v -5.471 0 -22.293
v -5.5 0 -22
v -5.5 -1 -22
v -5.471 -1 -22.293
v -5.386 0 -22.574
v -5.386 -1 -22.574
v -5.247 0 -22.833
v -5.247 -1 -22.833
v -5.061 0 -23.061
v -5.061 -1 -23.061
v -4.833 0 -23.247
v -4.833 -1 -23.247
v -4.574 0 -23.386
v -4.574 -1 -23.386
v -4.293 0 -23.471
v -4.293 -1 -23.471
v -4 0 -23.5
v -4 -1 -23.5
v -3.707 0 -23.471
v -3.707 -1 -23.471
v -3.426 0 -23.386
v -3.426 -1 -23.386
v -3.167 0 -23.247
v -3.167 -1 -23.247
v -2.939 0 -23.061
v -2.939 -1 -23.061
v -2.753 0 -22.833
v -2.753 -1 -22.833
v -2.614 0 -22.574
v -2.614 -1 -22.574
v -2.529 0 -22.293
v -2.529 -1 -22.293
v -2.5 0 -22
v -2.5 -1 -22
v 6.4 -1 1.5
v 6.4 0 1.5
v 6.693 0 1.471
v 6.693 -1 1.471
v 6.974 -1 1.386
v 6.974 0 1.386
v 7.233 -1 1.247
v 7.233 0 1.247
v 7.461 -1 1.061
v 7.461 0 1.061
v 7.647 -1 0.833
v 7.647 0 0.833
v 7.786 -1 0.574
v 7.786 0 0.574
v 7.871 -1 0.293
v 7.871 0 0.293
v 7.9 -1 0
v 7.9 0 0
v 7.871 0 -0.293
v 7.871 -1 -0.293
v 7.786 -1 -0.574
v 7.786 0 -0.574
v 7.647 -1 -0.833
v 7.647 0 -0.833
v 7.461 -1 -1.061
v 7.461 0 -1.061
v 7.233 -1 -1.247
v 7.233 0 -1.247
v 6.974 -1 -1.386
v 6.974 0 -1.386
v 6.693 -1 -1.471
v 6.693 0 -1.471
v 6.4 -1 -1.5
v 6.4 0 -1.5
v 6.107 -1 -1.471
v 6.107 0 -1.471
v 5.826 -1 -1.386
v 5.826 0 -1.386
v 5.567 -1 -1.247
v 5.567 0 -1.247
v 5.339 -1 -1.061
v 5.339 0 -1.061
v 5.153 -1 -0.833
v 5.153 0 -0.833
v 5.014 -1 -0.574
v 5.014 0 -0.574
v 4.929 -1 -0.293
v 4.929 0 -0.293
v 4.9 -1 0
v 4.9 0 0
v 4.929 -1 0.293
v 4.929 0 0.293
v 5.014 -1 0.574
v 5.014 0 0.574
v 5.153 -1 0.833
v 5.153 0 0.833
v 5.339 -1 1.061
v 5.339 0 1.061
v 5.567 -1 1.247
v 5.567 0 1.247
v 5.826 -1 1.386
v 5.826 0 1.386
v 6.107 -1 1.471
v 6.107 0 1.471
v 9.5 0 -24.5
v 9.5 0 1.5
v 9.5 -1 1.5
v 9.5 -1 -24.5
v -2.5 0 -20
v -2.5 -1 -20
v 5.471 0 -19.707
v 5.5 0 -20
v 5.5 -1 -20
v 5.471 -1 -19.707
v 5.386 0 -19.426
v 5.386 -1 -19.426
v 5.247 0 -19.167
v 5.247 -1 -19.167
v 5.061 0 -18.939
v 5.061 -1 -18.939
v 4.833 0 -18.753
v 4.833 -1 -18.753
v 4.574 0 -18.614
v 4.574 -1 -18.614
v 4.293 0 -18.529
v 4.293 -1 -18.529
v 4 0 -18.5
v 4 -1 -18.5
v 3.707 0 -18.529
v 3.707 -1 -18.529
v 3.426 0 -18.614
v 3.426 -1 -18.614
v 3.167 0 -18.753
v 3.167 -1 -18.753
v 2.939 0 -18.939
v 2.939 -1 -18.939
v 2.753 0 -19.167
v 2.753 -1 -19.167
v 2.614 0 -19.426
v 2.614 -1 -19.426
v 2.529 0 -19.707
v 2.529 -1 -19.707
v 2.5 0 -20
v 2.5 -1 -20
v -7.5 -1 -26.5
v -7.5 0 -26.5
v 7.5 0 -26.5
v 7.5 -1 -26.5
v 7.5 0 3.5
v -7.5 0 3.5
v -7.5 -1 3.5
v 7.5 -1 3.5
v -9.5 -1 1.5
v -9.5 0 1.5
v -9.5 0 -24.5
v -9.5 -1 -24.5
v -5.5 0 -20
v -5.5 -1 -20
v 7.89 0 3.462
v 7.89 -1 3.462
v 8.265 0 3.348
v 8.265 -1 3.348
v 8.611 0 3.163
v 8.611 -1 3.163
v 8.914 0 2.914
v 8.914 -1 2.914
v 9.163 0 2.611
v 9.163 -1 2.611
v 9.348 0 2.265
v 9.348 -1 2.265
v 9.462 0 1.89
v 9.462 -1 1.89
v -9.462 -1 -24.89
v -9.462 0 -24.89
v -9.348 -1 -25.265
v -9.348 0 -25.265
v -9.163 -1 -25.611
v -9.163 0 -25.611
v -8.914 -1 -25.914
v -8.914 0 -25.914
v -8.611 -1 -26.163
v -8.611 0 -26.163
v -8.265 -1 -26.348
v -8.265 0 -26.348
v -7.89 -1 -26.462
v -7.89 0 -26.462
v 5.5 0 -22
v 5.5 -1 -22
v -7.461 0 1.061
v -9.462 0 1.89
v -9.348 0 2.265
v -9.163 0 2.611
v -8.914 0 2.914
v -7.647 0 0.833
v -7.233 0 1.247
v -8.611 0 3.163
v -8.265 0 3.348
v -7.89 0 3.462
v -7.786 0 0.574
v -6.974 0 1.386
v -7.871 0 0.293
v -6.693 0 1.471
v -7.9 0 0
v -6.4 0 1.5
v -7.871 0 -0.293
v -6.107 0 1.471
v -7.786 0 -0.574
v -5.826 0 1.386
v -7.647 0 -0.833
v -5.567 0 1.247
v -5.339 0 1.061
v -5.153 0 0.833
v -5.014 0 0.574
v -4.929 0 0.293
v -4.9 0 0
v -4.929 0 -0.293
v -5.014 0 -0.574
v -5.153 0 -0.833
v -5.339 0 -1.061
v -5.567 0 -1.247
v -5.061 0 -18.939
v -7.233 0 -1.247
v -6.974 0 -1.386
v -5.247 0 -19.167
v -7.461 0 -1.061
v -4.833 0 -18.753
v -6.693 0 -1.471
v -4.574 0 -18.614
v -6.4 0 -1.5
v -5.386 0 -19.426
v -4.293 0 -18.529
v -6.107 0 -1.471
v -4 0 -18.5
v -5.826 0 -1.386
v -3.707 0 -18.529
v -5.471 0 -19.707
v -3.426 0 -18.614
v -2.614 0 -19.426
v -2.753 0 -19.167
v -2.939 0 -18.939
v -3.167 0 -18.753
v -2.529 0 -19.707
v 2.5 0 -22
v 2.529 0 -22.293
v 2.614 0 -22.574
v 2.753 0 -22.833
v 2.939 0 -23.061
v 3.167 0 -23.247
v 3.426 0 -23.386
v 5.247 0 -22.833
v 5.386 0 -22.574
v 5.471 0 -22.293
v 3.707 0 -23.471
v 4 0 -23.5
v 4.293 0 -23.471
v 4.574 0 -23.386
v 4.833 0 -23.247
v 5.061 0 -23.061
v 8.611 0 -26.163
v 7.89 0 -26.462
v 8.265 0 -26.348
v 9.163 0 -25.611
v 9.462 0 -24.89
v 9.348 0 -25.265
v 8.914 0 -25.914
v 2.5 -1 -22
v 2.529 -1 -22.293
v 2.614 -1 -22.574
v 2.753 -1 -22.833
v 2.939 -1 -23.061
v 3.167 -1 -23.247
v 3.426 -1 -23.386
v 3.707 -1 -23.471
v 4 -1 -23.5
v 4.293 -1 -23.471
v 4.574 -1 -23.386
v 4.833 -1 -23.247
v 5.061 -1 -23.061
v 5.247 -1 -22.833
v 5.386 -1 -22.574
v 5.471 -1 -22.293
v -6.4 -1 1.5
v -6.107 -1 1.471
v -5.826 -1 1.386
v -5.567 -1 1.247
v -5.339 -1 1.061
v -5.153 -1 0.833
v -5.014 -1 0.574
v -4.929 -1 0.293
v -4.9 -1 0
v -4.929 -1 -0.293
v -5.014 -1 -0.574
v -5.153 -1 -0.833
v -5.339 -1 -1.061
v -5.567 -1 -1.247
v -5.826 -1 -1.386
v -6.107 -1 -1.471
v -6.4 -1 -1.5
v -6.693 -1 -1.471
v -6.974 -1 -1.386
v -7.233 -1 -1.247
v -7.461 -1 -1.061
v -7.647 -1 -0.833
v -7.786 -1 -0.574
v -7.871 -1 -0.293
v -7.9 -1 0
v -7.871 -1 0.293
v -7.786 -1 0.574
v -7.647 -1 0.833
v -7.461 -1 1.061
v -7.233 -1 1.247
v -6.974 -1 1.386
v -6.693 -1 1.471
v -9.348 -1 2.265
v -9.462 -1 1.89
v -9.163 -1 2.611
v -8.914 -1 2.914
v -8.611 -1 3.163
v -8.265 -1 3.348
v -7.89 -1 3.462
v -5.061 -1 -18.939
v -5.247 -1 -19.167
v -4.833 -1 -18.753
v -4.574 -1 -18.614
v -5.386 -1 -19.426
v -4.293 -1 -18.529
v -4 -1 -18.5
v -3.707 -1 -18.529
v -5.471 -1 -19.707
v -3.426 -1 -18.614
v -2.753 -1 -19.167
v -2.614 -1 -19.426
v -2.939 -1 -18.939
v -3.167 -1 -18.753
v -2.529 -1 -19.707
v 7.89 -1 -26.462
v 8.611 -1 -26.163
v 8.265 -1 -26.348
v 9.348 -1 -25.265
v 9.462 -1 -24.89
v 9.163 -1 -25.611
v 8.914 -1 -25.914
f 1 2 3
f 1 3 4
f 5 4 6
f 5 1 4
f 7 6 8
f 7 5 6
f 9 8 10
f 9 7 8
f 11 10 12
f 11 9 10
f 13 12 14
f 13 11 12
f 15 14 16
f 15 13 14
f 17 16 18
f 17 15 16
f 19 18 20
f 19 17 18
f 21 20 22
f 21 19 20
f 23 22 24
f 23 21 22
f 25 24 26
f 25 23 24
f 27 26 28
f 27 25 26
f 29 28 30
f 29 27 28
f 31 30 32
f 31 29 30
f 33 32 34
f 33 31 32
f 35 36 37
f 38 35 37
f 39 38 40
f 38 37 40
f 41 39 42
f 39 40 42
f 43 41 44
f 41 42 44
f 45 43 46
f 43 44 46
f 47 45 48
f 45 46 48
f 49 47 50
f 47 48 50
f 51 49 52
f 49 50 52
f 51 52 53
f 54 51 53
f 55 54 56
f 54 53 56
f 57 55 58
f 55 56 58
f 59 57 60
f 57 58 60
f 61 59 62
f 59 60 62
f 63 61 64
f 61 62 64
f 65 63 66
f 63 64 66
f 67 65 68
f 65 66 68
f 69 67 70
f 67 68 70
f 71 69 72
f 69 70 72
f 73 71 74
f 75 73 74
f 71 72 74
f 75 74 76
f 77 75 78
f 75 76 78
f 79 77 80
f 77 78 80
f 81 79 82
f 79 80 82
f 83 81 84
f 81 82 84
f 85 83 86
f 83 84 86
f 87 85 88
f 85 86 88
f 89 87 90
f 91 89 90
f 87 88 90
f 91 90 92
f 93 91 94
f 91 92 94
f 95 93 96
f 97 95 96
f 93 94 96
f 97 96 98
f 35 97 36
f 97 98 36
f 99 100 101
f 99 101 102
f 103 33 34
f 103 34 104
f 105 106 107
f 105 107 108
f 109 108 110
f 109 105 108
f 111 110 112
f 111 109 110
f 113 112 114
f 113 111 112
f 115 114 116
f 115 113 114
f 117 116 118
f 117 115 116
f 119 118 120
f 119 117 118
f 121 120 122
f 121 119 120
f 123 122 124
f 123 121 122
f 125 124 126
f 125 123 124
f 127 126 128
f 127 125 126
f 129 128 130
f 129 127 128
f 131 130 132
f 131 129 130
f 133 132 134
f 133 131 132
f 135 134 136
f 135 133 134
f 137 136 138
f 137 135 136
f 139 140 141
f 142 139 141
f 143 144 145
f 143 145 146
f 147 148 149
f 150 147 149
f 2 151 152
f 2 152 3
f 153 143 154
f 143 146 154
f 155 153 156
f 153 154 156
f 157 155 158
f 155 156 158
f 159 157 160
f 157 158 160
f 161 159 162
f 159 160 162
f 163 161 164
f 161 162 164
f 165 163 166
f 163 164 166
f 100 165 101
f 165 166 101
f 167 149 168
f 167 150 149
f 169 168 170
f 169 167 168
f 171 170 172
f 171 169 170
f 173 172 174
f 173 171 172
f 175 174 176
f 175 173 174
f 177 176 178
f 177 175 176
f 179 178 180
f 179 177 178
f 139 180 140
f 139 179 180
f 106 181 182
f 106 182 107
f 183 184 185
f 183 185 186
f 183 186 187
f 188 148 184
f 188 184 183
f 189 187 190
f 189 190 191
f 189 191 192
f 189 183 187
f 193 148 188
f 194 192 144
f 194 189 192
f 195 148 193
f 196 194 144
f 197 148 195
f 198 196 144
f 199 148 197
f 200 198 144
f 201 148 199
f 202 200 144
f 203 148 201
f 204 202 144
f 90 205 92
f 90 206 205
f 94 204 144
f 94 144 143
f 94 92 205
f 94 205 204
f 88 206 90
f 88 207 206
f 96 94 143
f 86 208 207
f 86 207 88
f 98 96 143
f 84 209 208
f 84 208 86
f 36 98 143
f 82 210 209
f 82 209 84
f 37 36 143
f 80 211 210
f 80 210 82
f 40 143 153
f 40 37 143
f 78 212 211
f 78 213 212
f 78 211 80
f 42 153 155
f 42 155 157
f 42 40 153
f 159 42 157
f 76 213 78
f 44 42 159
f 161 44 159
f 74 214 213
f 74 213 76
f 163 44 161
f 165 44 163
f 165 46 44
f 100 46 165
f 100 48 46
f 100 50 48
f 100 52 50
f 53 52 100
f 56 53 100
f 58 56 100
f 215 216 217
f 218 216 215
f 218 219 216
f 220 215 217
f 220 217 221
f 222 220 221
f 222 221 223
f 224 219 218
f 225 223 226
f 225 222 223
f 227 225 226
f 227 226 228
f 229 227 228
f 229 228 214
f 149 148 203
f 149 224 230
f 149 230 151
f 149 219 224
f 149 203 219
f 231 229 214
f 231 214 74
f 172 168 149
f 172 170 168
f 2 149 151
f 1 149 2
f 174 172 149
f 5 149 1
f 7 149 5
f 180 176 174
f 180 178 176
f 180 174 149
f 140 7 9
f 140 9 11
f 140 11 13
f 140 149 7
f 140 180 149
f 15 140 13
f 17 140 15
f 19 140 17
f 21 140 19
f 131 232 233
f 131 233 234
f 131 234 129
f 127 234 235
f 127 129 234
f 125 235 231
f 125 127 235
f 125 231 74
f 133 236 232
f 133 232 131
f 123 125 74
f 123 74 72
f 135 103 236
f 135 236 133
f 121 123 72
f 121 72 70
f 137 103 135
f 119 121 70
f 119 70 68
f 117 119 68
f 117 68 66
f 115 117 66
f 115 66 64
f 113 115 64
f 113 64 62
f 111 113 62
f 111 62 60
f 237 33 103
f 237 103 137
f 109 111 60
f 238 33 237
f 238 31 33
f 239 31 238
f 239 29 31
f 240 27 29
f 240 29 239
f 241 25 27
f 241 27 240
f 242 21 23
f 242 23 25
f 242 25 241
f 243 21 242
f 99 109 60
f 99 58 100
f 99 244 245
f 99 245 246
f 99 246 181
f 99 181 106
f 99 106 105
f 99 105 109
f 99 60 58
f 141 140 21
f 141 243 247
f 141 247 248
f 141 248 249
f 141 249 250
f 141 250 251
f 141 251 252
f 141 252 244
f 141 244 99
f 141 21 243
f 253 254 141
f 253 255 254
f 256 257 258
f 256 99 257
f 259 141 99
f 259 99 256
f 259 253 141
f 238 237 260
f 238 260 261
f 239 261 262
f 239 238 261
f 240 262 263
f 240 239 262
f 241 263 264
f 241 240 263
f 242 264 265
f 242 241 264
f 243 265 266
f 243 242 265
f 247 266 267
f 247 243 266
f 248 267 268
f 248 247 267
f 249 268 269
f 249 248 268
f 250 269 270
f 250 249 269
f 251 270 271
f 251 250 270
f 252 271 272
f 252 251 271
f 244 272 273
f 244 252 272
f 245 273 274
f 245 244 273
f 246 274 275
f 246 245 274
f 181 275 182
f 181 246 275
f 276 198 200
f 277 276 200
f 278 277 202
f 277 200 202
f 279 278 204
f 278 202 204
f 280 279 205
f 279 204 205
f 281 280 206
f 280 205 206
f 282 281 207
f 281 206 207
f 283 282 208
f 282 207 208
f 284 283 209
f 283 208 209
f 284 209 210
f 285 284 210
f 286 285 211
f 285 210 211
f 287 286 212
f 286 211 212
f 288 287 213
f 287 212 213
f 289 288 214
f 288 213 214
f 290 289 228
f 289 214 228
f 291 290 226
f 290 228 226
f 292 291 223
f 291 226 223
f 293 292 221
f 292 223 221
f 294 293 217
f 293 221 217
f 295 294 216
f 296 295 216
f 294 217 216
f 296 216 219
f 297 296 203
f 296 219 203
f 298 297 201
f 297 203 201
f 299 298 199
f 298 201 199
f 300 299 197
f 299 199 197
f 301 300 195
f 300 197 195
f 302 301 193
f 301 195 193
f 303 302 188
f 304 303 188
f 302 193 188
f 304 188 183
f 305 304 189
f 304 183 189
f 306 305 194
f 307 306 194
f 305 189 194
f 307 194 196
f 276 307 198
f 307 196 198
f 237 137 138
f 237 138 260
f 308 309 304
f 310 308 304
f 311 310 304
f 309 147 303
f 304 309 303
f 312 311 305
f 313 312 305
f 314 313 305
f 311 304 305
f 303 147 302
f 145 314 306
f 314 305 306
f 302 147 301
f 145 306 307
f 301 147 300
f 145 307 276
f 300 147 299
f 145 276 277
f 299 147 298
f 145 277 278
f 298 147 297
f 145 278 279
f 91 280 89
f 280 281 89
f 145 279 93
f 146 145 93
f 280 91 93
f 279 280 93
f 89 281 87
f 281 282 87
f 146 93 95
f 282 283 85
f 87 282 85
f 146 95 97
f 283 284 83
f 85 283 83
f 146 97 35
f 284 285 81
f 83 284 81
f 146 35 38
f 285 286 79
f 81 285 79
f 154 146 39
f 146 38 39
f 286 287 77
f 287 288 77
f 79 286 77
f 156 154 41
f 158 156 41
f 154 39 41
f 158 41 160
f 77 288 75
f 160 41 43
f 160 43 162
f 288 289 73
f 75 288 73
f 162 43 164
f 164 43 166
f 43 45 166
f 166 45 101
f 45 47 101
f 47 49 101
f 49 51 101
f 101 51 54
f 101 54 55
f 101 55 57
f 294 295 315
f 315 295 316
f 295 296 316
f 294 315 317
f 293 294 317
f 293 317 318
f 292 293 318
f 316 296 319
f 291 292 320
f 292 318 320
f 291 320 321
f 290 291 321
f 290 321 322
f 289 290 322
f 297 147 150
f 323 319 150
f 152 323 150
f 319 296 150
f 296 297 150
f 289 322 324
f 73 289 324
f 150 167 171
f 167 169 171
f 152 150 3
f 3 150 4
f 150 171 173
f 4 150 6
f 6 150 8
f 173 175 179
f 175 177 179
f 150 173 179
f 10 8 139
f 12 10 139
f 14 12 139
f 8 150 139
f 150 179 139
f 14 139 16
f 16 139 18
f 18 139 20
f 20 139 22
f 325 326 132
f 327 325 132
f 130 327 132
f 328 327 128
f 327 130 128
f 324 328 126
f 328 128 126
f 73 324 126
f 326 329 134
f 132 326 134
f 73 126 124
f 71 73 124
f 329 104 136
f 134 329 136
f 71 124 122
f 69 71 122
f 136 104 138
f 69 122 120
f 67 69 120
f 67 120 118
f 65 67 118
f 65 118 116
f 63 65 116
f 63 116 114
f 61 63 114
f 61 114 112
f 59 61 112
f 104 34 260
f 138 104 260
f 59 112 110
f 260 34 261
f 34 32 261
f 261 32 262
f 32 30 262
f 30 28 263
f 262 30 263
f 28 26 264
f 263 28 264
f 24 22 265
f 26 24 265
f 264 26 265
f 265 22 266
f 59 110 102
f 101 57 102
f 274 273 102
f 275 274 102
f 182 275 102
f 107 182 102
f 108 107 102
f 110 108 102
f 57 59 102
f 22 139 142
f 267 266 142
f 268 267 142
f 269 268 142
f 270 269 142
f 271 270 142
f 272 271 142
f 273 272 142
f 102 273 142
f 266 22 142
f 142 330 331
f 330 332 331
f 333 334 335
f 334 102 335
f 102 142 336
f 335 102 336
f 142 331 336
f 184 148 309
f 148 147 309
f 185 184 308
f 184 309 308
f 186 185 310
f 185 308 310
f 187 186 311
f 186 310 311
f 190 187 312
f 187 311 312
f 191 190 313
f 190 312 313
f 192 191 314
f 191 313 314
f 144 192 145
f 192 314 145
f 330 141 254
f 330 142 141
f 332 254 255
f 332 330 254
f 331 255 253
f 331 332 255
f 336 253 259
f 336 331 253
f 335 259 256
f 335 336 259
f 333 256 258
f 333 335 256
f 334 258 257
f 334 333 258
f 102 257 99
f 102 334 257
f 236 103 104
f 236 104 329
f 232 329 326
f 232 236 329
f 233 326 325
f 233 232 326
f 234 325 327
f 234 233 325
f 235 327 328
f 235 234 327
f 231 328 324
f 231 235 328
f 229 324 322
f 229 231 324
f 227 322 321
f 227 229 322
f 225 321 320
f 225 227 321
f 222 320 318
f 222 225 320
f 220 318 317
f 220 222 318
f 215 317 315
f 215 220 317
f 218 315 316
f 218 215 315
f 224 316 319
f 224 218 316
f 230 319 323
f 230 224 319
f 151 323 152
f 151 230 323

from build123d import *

# Parameters (mm, degrees)
SKETCH_1_W             = 19
SKETCH_1_H             = 30
SKETCH_1_R             = 1.5
SM_BASE_FLANGE_1_DEPTH = 1
FILLET_1_R             = 2


# Sheet-metal steps are written as plain solids
with BuildPart() as part:
    # Sketch 1 → 基体-法兰1 (new body)
    with BuildSketch(Plane(origin=(0, 0, 0), x_dir=(1, 0, 0), z_dir=(0, 1, 0))):
        with Locations((0, 11.5)):
            Rectangle(SKETCH_1_W, SKETCH_1_H)
        with Locations(Location((-6.4, 0, 0), (0, 0, 270))):
            Circle(SKETCH_1_R, mode=Mode.SUBTRACT)
        with Locations(Location((6.4, 0, 0), (0, 0, 270))):
            Circle(SKETCH_1_R, mode=Mode.SUBTRACT)
        with BuildLine():
            Line((-2.5, 22), (-2.5, 20))
            ThreePointArc((-2.5, 20), (-4, 18.5), (-5.5, 20))
            Line((-5.5, 20), (-5.5, 22))
            ThreePointArc((-5.5, 22), (-4, 23.5), (-2.5, 22))
        make_face(mode=Mode.SUBTRACT)
        with BuildLine():
            Line((5.5, 22), (5.5, 20))
            ThreePointArc((5.5, 20), (4, 18.5), (2.5, 20))
            Line((2.5, 20), (2.5, 22))
            ThreePointArc((2.5, 22), (4, 23.5), (5.5, 22))
        make_face(mode=Mode.SUBTRACT)
    extrude(amount=-SM_BASE_FLANGE_1_DEPTH)

    # 圆角1
    fillet_1_edges = [part.edges().sort_by_distance(p)[0] for p in [
        (9.5, -0.5, -26.5),
        (9.5, -0.5, 3.5),
        (-9.5, -0.5, 3.5),
        (-9.5, -0.5, -26.5),
    ]]
    fillet(fillet_1_edges, radius=FILLET_1_R)


solid = part.part
